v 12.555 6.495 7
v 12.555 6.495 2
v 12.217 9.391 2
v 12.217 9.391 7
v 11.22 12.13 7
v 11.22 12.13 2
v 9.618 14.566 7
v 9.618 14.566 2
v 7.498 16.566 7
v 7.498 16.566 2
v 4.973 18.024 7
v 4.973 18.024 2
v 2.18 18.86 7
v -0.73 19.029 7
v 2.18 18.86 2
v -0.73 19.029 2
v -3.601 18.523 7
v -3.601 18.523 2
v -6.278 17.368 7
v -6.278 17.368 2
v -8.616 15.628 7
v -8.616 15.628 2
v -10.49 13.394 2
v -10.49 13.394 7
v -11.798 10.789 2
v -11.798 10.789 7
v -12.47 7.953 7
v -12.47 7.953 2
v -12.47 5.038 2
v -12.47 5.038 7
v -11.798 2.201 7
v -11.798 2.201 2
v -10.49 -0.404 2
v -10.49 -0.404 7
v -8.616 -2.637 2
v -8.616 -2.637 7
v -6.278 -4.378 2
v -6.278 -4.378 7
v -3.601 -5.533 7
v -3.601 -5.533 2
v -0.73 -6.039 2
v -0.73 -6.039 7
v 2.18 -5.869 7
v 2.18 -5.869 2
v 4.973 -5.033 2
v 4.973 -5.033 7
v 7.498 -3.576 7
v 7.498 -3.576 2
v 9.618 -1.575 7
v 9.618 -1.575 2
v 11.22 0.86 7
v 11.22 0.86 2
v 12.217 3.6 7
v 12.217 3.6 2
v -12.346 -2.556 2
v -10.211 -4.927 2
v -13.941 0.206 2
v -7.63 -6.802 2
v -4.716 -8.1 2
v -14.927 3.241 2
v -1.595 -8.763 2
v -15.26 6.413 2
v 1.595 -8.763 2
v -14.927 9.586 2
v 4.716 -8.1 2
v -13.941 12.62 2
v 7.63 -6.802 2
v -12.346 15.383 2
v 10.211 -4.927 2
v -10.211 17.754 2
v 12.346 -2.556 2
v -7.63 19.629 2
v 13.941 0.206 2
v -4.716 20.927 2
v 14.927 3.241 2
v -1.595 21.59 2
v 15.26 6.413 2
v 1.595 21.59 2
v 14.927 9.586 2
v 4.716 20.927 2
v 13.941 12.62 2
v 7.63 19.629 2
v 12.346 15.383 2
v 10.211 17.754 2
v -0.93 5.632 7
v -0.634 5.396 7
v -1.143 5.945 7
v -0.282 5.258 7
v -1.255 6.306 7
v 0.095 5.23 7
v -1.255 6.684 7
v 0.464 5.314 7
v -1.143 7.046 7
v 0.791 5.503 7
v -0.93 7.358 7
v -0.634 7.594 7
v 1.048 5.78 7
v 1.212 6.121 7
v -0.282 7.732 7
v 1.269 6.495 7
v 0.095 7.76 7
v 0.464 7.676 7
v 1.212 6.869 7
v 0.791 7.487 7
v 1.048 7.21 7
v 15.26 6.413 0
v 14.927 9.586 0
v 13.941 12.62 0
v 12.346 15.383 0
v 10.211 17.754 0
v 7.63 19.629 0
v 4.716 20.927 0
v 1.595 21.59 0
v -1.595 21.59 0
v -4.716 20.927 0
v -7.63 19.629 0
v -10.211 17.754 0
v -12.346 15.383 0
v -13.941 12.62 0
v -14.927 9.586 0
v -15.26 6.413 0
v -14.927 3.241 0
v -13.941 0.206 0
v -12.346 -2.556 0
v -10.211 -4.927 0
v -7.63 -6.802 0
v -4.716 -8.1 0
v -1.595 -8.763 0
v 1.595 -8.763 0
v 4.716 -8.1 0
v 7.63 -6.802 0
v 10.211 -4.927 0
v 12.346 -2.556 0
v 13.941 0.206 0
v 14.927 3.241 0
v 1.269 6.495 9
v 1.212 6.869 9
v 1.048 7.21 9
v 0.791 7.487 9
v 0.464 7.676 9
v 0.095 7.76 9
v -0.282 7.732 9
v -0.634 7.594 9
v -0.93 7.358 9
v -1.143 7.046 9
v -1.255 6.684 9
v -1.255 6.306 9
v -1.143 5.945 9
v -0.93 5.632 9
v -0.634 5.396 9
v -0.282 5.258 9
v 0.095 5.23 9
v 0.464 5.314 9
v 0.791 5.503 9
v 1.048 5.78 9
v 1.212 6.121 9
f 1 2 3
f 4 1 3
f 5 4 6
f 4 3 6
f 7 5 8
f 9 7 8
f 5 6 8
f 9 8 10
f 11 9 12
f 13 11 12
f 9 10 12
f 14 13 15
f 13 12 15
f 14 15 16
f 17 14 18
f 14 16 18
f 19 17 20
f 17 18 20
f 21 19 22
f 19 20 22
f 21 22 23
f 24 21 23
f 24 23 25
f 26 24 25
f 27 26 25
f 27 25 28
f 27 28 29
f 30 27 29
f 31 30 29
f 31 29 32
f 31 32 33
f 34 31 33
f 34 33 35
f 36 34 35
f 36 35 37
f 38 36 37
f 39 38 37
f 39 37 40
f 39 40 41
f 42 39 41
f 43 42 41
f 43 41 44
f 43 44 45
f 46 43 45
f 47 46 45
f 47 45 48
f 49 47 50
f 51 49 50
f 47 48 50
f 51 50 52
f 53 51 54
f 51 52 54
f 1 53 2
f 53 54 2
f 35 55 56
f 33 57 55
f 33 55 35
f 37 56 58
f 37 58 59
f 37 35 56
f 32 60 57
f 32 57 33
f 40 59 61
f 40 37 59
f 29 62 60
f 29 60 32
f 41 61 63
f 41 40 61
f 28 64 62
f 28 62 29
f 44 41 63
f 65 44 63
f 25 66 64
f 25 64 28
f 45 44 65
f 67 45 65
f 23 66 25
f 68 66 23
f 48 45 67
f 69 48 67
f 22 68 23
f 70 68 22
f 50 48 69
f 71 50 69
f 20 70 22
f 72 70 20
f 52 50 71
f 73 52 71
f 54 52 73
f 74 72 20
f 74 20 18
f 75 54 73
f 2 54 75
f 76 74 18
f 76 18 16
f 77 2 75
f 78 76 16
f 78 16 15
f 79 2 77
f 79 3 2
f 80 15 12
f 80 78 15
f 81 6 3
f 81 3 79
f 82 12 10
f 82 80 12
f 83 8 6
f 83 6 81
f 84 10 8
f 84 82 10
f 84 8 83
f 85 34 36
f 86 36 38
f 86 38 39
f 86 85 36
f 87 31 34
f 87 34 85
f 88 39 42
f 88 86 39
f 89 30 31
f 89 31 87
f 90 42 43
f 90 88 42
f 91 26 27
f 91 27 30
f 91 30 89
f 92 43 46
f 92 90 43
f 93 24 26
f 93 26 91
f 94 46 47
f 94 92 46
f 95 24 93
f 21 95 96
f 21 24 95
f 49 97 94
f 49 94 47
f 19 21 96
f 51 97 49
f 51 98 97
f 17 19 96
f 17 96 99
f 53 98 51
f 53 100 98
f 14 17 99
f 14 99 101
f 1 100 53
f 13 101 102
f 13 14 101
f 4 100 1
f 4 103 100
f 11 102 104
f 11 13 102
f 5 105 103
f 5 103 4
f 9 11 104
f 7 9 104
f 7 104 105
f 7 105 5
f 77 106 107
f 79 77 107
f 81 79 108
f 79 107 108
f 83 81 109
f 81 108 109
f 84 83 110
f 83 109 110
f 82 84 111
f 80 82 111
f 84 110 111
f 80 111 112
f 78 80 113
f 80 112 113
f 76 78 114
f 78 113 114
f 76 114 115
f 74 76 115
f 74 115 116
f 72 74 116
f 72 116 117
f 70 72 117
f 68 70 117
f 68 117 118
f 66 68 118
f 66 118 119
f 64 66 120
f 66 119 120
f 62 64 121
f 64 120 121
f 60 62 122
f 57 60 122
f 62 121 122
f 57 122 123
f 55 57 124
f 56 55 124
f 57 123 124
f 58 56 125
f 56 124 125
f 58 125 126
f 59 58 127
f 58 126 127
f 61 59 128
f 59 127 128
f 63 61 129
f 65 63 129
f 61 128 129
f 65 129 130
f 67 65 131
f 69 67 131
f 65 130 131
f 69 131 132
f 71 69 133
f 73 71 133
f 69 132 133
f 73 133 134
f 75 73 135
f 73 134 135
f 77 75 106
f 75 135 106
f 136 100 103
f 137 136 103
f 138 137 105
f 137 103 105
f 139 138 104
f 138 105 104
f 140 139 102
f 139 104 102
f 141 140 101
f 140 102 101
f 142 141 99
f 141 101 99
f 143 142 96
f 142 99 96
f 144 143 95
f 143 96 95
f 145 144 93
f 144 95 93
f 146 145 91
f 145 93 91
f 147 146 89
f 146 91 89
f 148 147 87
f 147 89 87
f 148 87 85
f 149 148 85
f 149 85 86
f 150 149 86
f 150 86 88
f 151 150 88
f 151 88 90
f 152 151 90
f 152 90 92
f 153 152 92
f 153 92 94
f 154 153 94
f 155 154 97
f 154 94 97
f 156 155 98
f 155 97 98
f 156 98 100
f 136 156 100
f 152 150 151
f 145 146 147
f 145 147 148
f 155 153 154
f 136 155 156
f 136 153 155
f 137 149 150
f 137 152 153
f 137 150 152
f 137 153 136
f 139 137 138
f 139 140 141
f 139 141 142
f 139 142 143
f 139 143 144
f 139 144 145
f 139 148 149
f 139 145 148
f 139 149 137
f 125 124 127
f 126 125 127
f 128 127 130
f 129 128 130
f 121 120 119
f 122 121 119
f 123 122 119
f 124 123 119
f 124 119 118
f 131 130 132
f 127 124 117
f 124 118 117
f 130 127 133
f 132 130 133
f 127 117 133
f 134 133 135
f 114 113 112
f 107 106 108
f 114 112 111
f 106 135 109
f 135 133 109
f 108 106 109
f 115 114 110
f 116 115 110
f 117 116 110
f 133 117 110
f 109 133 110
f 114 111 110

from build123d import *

# Parameters (mm, degrees)
F0_R     = 12.55535
F2_DEPTH = 7
F1_R     = 15.260339
F3_DEPTH = 2
F4_R     = 1.26869
F5_DEPTH = 2


with BuildPart() as f2:
    # F0 (on Top) → F2 (new body)
    with BuildSketch(Plane.XY):
        with Locations((0, 6.495178)):
            Circle(F0_R)
    extrude(amount=F2_DEPTH)

    # F1 (on Top) → F3 (join)
    with BuildSketch(Plane.XY):
        with Locations((0, 6.413349)):
            Circle(F1_R)
    extrude(amount=F3_DEPTH)

    # F4 (on face) → F5 (join)
    with BuildSketch(Plane.XY.offset(7)):
        with Locations((0, 6.495178)):
            Circle(F4_R)
    extrude(amount=F5_DEPTH)


solid = f2.part
